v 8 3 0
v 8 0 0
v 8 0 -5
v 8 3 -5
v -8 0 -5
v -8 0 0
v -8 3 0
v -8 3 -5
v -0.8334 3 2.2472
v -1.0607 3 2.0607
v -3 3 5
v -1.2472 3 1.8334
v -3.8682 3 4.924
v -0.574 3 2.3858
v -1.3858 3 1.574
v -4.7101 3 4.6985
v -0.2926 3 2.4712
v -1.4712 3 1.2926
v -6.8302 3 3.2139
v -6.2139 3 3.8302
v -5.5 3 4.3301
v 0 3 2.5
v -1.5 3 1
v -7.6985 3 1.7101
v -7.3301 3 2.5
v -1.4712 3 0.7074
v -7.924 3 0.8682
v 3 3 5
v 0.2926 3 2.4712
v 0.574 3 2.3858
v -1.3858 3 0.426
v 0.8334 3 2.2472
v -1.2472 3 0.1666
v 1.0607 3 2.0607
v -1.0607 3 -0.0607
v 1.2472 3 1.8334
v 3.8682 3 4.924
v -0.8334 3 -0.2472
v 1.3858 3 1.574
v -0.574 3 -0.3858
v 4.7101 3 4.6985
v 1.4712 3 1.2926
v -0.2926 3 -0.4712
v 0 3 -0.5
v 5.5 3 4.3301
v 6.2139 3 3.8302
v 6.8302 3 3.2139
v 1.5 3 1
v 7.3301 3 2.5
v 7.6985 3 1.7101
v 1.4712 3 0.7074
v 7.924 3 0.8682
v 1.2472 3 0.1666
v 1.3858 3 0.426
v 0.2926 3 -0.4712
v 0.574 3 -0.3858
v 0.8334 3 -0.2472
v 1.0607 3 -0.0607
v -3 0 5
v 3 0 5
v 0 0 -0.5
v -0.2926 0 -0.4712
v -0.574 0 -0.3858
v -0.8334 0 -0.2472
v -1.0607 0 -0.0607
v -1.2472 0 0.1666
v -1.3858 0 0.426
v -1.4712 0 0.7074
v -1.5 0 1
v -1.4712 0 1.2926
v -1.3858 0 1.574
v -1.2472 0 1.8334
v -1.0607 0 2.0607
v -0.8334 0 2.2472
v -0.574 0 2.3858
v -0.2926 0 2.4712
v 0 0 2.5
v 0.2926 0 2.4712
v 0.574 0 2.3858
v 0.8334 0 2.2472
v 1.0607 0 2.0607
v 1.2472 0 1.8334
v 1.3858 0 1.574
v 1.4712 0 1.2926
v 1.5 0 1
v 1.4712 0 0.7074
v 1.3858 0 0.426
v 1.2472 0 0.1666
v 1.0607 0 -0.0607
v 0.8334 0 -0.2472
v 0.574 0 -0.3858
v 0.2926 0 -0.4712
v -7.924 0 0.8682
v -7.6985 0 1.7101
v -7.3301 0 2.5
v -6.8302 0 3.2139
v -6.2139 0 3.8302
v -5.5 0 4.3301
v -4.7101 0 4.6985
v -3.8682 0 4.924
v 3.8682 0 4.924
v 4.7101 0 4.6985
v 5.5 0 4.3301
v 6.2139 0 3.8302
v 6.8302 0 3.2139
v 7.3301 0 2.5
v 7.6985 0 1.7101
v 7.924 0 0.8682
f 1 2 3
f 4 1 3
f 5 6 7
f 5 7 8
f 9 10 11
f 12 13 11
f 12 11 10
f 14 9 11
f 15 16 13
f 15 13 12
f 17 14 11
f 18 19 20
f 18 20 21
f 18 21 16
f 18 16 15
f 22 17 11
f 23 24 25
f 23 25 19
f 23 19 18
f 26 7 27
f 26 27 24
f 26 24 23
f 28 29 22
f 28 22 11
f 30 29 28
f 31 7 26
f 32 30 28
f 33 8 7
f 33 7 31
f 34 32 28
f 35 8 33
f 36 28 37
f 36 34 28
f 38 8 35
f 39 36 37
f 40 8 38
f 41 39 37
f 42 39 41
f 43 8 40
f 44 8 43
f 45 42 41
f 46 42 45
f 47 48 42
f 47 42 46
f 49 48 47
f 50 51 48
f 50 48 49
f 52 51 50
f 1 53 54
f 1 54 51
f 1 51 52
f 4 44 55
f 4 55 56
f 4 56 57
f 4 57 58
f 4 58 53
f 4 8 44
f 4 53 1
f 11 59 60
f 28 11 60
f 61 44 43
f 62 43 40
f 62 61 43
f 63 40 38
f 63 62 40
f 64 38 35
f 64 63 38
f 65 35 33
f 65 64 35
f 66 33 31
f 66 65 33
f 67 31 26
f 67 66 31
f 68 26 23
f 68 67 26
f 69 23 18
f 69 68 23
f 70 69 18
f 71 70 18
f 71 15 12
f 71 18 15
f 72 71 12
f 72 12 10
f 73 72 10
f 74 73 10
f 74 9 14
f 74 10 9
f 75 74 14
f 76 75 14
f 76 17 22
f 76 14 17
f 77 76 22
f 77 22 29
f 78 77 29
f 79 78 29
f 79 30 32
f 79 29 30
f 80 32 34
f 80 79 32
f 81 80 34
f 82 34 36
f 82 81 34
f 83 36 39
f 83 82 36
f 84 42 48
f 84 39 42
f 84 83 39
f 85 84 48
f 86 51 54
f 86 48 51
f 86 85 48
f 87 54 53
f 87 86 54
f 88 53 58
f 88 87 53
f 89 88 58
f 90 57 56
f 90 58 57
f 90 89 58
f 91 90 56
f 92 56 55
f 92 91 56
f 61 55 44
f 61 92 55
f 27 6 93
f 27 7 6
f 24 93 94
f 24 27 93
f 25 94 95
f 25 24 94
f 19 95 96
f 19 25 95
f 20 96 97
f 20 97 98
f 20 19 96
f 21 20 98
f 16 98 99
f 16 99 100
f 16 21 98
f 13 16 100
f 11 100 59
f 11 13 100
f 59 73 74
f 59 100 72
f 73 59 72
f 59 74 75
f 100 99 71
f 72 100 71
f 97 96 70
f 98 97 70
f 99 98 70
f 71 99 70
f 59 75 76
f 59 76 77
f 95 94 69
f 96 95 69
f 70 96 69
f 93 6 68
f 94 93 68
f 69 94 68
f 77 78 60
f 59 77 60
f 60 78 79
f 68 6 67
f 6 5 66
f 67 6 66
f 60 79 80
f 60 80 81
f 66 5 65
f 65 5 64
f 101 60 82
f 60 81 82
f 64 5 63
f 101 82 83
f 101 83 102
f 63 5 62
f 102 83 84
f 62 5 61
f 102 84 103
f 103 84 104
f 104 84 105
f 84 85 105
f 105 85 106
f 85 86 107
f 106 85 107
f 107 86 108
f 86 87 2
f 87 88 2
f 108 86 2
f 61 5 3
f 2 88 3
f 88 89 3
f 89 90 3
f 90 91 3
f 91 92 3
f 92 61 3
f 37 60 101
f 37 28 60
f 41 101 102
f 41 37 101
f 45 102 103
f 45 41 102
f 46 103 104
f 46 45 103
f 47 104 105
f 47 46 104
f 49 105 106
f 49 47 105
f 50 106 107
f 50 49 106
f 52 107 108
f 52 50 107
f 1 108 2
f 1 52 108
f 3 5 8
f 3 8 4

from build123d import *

# Parameters (mm, degrees)
SKETCH1_W           = 16
SKETCH1_H           = 10
BOSS_EXTRUDE1_DEPTH = 3
CUT_EXTRUDE1_REACH  = 11.899
SKETCH2_R           = 1.5
FILLET1_R           = 5


with BuildPart() as part:
    # Sketch1 → Boss-Extrude1 (new body)
    with BuildSketch(Plane(origin=(0, 0, 0), x_dir=(1, 0, 0), z_dir=(0, 1, 0))):
        Rectangle(SKETCH1_W, SKETCH1_H)
    extrude(amount=BOSS_EXTRUDE1_DEPTH)

    # Sketch2 → Cut-Extrude1 (cut, up to next)
    with BuildSketch(Plane(origin=(0, 0, 0), x_dir=(1, 0, 0), z_dir=(0, 1, 0)), mode=Mode.PRIVATE) as cut_extrude1_sk1:
        with Locations(Location((0, -1, 0), (0, 0, 90))):
            Circle(SKETCH2_R)
    cut_extrude1_tool1 = extrude(cut_extrude1_sk1.sketch, amount=CUT_EXTRUDE1_REACH, mode=Mode.PRIVATE) & part.part
    add(cut_extrude1_tool1.solids().sort_by_distance((0, 0, 1))[0], mode=Mode.SUBTRACT)

    # Fillet1
    fillet1_edges = [part.edges().sort_by_distance(p)[0] for p in [
        (8, 1.5, 5),
        (-8, 1.5, 5),
    ]]
    fillet(fillet1_edges, radius=FILLET1_R)


solid = part.part
